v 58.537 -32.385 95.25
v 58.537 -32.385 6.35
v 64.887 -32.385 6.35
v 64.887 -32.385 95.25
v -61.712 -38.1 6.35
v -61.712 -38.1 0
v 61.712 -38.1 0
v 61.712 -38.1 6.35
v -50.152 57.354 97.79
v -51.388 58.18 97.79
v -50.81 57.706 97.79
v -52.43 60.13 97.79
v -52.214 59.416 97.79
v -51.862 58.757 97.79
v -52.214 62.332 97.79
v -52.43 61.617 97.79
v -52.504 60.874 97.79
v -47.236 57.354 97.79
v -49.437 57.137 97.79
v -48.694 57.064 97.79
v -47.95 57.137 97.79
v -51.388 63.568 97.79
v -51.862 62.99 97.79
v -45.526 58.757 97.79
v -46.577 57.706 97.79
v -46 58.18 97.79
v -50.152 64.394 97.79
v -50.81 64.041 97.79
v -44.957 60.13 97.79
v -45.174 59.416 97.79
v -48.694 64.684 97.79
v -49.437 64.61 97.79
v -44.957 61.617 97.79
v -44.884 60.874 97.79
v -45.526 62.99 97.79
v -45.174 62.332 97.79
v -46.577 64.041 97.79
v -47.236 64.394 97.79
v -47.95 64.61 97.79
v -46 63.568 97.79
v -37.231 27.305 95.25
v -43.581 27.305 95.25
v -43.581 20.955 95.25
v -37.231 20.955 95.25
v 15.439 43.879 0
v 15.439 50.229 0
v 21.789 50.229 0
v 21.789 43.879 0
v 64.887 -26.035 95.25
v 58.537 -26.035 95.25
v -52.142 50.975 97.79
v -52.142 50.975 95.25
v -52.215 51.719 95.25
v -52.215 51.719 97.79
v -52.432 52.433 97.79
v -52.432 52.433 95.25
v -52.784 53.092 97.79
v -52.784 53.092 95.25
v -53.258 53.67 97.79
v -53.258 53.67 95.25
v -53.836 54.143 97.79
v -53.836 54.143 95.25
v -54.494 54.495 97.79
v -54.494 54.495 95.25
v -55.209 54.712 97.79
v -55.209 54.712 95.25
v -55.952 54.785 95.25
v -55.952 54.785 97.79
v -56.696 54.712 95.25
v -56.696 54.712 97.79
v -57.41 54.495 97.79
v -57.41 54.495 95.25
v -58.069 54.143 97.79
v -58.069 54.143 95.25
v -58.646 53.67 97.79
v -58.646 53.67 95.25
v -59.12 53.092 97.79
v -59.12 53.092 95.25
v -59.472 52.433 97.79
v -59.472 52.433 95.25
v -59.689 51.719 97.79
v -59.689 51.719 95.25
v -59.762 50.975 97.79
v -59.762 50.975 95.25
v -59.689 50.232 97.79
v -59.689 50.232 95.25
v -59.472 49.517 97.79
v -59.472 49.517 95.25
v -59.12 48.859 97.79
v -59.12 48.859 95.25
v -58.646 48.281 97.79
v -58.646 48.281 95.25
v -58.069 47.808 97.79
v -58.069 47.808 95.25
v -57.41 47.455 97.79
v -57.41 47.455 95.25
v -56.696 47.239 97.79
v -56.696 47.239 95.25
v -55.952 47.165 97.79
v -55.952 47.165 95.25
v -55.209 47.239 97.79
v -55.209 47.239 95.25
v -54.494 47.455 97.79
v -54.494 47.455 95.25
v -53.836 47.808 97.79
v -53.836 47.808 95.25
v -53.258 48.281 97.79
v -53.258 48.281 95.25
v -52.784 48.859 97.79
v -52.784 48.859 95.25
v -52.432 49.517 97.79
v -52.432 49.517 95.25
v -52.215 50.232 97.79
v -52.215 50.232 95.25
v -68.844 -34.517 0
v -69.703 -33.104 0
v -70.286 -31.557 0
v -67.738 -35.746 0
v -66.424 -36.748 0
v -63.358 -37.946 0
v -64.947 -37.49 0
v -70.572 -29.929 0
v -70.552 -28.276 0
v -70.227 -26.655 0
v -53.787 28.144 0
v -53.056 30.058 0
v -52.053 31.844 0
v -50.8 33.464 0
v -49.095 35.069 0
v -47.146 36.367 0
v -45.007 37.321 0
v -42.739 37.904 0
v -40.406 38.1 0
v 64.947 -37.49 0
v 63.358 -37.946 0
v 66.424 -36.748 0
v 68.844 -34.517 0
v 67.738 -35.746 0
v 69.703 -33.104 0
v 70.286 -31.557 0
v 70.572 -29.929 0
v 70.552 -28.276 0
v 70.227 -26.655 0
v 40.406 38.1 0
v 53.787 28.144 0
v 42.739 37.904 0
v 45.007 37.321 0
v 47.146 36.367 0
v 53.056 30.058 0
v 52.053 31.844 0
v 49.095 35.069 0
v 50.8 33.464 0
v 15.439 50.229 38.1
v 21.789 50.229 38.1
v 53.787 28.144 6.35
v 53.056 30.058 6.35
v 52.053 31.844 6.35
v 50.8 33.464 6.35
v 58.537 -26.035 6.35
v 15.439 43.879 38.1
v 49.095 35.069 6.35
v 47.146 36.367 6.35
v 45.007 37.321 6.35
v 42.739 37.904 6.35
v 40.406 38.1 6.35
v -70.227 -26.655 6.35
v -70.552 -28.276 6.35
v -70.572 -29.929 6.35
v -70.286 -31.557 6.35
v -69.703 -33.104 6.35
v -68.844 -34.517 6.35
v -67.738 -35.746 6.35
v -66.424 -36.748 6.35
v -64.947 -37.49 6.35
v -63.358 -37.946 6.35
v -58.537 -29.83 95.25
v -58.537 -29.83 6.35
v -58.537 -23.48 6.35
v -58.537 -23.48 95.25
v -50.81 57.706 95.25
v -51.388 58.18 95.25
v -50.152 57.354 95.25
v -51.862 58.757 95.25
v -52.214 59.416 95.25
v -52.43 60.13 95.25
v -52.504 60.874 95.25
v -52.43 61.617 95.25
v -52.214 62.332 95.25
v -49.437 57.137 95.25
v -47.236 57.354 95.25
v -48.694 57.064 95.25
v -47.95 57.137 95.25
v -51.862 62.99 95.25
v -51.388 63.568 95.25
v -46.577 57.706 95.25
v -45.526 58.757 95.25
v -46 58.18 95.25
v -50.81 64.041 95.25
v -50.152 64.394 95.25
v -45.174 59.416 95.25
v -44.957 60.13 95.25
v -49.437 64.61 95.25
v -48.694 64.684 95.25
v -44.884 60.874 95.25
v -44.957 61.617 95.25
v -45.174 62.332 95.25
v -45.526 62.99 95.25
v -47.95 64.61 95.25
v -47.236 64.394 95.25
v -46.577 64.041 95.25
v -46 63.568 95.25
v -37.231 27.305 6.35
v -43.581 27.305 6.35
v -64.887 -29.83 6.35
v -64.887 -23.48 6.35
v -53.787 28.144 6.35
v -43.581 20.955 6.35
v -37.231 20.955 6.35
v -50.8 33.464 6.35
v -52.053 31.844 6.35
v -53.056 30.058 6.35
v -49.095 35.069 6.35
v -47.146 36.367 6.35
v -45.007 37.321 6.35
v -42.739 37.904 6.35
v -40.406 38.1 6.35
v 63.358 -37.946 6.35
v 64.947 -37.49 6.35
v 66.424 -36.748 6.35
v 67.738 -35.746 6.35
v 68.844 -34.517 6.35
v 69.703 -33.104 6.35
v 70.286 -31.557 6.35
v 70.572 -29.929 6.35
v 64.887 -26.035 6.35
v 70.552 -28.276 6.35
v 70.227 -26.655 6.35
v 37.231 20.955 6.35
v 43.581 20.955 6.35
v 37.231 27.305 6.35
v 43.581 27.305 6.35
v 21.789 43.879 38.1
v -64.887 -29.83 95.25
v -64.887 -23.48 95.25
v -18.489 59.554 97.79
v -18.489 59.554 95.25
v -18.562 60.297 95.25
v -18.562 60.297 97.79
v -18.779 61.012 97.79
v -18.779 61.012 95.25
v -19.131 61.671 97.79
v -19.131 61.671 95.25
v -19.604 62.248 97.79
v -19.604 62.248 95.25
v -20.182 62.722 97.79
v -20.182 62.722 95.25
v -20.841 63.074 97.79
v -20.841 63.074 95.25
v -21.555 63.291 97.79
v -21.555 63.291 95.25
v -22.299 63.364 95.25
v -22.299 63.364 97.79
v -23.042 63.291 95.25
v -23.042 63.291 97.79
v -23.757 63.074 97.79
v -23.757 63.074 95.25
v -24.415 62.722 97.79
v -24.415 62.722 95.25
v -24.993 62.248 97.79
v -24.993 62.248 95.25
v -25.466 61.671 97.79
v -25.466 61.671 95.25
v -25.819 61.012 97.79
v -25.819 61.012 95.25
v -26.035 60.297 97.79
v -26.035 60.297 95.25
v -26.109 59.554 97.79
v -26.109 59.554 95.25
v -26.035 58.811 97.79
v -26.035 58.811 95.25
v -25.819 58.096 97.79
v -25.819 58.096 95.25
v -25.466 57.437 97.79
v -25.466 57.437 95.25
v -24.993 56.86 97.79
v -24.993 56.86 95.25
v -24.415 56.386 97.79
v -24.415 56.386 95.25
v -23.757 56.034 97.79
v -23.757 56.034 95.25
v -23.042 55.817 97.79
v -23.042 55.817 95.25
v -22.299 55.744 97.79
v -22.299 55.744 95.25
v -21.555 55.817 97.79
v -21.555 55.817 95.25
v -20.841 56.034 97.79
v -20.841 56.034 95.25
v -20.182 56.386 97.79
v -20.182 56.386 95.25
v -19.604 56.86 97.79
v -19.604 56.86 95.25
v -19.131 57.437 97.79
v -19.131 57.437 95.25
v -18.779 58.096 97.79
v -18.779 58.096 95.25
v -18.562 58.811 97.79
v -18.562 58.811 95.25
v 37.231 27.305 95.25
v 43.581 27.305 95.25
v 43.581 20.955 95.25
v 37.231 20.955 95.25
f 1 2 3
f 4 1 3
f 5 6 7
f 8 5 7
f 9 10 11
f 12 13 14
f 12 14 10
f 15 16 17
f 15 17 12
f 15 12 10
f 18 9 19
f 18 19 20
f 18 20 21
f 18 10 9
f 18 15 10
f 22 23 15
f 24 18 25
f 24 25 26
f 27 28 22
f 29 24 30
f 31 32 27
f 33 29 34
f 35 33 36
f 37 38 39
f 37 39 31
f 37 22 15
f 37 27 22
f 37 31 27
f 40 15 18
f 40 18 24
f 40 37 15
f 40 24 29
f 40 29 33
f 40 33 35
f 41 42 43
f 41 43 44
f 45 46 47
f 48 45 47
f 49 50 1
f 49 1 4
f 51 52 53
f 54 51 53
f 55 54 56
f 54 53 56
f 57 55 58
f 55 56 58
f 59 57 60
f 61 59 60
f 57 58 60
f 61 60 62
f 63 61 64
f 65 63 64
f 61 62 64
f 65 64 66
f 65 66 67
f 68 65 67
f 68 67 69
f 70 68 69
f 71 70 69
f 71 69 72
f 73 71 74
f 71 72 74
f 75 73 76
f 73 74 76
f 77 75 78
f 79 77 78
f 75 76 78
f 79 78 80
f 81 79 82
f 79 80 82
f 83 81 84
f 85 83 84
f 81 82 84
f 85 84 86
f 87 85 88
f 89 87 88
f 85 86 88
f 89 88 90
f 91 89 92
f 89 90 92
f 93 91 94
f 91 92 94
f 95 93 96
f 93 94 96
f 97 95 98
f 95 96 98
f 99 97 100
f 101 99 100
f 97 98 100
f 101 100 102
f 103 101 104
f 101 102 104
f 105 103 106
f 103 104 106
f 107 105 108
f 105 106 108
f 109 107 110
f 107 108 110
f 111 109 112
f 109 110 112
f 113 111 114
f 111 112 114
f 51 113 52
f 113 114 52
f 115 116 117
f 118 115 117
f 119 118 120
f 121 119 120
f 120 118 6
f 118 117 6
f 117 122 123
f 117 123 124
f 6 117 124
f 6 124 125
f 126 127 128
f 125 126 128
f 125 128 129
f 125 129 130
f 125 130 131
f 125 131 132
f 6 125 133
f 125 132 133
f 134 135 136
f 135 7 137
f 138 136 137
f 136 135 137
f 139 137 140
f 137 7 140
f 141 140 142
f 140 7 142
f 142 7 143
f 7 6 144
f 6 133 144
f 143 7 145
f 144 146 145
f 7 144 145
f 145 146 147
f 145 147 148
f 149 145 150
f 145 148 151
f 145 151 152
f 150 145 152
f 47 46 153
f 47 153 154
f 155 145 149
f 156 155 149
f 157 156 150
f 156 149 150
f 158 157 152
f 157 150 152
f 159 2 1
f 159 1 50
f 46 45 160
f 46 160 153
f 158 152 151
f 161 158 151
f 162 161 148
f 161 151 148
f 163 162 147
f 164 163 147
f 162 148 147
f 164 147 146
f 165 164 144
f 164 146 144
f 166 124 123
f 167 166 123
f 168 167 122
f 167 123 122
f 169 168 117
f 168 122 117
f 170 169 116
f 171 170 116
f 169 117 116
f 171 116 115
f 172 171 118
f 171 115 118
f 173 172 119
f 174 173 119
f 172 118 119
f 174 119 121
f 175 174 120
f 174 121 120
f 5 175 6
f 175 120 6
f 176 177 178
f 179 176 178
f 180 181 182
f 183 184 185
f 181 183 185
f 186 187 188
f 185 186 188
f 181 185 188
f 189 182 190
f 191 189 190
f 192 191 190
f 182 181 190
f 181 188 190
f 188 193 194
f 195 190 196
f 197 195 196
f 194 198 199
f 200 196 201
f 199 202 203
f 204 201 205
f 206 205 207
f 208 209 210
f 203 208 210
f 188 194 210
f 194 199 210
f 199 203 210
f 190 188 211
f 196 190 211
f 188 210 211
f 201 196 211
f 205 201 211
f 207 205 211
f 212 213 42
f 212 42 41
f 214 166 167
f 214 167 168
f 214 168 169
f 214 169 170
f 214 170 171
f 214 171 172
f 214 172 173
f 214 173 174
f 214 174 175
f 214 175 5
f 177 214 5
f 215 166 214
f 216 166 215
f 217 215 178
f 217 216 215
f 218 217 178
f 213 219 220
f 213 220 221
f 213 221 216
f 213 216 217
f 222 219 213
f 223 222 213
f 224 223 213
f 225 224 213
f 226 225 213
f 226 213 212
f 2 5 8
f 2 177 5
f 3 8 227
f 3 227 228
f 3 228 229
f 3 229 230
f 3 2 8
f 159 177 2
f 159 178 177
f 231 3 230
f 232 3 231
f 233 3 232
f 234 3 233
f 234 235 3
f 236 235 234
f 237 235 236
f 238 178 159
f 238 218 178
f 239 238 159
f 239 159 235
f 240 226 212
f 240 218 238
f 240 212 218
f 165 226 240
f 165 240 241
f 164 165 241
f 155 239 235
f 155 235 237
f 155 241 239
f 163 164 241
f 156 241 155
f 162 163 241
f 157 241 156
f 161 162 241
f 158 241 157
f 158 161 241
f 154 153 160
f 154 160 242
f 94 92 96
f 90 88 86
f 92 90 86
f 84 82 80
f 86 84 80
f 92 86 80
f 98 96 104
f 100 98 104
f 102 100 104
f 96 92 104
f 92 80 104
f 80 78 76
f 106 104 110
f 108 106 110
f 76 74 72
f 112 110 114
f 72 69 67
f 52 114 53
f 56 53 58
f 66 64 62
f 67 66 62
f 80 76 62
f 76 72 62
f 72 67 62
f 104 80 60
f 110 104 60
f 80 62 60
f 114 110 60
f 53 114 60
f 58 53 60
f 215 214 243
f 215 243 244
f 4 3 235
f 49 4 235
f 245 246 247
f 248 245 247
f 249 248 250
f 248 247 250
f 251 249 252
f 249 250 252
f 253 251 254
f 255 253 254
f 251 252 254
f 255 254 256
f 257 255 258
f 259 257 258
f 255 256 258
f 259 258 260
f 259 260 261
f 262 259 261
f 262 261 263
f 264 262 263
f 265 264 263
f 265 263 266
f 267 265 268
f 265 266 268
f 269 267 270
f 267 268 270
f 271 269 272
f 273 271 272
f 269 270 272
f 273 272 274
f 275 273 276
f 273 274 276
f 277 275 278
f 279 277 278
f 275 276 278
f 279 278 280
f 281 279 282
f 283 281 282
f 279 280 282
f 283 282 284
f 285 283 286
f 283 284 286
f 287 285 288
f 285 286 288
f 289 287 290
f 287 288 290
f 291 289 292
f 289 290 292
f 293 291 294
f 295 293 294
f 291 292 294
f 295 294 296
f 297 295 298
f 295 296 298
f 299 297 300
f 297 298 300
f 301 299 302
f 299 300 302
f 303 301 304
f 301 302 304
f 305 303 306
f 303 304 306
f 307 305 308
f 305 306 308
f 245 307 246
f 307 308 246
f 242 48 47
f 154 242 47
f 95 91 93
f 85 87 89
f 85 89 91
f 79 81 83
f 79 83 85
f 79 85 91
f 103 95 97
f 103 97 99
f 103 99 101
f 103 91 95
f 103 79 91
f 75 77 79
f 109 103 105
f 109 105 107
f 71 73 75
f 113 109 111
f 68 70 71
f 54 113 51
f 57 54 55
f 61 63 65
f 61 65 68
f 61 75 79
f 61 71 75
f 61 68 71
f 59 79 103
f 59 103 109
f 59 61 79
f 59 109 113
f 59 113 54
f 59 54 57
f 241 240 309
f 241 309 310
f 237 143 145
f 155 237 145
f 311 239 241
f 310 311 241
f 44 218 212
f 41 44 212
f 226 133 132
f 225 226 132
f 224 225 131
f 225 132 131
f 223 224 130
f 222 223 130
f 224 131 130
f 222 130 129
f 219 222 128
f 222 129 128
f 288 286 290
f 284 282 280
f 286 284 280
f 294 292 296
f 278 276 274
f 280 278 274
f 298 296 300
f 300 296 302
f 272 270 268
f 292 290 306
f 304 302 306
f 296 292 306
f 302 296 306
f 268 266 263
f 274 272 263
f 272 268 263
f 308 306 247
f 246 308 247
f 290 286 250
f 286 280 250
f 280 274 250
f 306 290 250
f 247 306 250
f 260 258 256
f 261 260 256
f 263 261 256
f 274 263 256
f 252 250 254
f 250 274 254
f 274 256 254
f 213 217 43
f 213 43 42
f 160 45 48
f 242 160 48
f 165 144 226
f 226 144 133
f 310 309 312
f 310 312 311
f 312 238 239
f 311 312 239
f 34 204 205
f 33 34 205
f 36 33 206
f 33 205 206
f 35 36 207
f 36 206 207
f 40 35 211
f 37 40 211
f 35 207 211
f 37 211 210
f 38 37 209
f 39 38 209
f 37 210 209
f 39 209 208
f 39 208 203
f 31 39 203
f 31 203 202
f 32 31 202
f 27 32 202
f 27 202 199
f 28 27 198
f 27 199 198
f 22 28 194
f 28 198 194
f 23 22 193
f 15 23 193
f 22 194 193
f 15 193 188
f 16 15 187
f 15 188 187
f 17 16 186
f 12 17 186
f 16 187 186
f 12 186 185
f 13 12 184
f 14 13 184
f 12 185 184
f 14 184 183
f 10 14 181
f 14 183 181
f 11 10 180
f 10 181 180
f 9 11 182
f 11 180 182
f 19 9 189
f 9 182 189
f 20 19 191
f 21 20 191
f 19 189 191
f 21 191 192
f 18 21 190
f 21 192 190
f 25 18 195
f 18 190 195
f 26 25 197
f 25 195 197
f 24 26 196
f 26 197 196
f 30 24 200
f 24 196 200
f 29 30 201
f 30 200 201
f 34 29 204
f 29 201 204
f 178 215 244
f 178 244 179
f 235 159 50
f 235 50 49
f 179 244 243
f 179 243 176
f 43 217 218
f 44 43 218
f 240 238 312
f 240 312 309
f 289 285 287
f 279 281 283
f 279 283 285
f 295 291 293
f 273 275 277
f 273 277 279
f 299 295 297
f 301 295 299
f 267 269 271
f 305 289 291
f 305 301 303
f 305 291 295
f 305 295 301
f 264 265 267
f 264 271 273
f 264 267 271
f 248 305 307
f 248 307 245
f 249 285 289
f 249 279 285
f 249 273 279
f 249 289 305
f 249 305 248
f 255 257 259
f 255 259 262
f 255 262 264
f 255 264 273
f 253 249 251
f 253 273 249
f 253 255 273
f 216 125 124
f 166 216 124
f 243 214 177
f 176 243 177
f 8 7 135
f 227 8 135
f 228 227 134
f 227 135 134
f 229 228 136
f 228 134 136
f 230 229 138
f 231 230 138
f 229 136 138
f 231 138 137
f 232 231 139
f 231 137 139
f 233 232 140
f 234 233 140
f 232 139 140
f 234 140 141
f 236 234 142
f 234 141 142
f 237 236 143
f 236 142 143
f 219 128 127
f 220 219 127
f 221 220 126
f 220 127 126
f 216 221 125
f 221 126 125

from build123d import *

# Parameters (mm, degrees)
F1_DEPTH = 6.35
F2_W     = 6.35
F2_H     = 6.35
F3_DEPTH = 88.9
F4_R     = 3.81
F5_DEPTH = 2.54
F6_W     = 6.35
F6_H     = 6.35
F7_DEPTH = 38.1


with BuildPart() as f1:
    # F0 (on Top) → F1 (new body)
    with BuildSketch(Plane.XY):
        with BuildLine():
            Line((40.405892, 38.1), (-40.405892, 38.1))
            ThreePointArc((-40.405892, 38.1), (-46.096455, 36.888463), (-50.8, 33.463992))
            Line((-50.8, 33.463992), (-50.8, -38.1))
            Line((-50.8, -38.1), (50.8, -38.1))
            Line((50.8, -38.1), (50.8, 33.463992))
            ThreePointArc((50.8, 33.463992), (46.096455, 36.888463), (40.405892, 38.1))
        make_face()
        with BuildLine():
            Line((-50.8, -38.1), (-50.8, 33.463992))
            ThreePointArc((-50.8, 33.463992), (-52.587307, 30.969154), (-53.786725, 28.14425))
            Line((-53.786725, 28.14425), (-70.226643, -26.655477))
            ThreePointArc((-70.226643, -26.655477), (-68.843952, -34.516712), (-61.711568, -38.1))
            Line((-61.711568, -38.1), (-50.8, -38.1))
        make_face()
        with BuildLine():
            ThreePointArc((53.786725, 28.14425), (52.587307, 30.969154), (50.8, 33.463992))
            Line((50.8, 33.463992), (50.8, -38.1))
            Line((50.8, -38.1), (61.711568, -38.1))
            ThreePointArc((61.711568, -38.1), (68.843952, -34.516712), (70.226643, -26.655477))
            Line((70.226643, -26.655477), (53.786725, 28.14425))
        make_face()
    extrude(amount=F1_DEPTH)

    # F2 (on face) → F3 (join)
    with BuildSketch(Plane.XY.offset(6.35)):
        with Locations((-40.405892, 24.13)):
            Rectangle(F2_W, F2_H)
        with Locations((40.405892, 24.13)):
            Rectangle(F2_W, F2_H)
        with Locations((-61.711568, -26.655477)):
            Rectangle(F2_W, F2_H)
        with Locations((61.711568, -29.21)):
            Rectangle(F2_W, F2_H)
    extrude(amount=F3_DEPTH)


with BuildPart() as f5:
    # F4 (on face) → F5 (new body)
    with BuildSketch(Plane.XY.offset(95.25)):
        with Locations((-48.693627, 60.873587)):
            Circle(F4_R)
        with Locations((-55.952266, 50.975442)):
            Circle(F4_R)
        with Locations((-22.298576, 59.553832)):
            Circle(F4_R)
    extrude(amount=F5_DEPTH)


with BuildPart() as f7:
    # F6 (on Top) → F7 (new body)
    with BuildSketch(Plane.XY):
        with Locations((18.613756, 47.053934)):
            Rectangle(F6_W, F6_H)
    extrude(amount=F7_DEPTH)


solid = Compound([f1.part, f5.part, f7.part])
